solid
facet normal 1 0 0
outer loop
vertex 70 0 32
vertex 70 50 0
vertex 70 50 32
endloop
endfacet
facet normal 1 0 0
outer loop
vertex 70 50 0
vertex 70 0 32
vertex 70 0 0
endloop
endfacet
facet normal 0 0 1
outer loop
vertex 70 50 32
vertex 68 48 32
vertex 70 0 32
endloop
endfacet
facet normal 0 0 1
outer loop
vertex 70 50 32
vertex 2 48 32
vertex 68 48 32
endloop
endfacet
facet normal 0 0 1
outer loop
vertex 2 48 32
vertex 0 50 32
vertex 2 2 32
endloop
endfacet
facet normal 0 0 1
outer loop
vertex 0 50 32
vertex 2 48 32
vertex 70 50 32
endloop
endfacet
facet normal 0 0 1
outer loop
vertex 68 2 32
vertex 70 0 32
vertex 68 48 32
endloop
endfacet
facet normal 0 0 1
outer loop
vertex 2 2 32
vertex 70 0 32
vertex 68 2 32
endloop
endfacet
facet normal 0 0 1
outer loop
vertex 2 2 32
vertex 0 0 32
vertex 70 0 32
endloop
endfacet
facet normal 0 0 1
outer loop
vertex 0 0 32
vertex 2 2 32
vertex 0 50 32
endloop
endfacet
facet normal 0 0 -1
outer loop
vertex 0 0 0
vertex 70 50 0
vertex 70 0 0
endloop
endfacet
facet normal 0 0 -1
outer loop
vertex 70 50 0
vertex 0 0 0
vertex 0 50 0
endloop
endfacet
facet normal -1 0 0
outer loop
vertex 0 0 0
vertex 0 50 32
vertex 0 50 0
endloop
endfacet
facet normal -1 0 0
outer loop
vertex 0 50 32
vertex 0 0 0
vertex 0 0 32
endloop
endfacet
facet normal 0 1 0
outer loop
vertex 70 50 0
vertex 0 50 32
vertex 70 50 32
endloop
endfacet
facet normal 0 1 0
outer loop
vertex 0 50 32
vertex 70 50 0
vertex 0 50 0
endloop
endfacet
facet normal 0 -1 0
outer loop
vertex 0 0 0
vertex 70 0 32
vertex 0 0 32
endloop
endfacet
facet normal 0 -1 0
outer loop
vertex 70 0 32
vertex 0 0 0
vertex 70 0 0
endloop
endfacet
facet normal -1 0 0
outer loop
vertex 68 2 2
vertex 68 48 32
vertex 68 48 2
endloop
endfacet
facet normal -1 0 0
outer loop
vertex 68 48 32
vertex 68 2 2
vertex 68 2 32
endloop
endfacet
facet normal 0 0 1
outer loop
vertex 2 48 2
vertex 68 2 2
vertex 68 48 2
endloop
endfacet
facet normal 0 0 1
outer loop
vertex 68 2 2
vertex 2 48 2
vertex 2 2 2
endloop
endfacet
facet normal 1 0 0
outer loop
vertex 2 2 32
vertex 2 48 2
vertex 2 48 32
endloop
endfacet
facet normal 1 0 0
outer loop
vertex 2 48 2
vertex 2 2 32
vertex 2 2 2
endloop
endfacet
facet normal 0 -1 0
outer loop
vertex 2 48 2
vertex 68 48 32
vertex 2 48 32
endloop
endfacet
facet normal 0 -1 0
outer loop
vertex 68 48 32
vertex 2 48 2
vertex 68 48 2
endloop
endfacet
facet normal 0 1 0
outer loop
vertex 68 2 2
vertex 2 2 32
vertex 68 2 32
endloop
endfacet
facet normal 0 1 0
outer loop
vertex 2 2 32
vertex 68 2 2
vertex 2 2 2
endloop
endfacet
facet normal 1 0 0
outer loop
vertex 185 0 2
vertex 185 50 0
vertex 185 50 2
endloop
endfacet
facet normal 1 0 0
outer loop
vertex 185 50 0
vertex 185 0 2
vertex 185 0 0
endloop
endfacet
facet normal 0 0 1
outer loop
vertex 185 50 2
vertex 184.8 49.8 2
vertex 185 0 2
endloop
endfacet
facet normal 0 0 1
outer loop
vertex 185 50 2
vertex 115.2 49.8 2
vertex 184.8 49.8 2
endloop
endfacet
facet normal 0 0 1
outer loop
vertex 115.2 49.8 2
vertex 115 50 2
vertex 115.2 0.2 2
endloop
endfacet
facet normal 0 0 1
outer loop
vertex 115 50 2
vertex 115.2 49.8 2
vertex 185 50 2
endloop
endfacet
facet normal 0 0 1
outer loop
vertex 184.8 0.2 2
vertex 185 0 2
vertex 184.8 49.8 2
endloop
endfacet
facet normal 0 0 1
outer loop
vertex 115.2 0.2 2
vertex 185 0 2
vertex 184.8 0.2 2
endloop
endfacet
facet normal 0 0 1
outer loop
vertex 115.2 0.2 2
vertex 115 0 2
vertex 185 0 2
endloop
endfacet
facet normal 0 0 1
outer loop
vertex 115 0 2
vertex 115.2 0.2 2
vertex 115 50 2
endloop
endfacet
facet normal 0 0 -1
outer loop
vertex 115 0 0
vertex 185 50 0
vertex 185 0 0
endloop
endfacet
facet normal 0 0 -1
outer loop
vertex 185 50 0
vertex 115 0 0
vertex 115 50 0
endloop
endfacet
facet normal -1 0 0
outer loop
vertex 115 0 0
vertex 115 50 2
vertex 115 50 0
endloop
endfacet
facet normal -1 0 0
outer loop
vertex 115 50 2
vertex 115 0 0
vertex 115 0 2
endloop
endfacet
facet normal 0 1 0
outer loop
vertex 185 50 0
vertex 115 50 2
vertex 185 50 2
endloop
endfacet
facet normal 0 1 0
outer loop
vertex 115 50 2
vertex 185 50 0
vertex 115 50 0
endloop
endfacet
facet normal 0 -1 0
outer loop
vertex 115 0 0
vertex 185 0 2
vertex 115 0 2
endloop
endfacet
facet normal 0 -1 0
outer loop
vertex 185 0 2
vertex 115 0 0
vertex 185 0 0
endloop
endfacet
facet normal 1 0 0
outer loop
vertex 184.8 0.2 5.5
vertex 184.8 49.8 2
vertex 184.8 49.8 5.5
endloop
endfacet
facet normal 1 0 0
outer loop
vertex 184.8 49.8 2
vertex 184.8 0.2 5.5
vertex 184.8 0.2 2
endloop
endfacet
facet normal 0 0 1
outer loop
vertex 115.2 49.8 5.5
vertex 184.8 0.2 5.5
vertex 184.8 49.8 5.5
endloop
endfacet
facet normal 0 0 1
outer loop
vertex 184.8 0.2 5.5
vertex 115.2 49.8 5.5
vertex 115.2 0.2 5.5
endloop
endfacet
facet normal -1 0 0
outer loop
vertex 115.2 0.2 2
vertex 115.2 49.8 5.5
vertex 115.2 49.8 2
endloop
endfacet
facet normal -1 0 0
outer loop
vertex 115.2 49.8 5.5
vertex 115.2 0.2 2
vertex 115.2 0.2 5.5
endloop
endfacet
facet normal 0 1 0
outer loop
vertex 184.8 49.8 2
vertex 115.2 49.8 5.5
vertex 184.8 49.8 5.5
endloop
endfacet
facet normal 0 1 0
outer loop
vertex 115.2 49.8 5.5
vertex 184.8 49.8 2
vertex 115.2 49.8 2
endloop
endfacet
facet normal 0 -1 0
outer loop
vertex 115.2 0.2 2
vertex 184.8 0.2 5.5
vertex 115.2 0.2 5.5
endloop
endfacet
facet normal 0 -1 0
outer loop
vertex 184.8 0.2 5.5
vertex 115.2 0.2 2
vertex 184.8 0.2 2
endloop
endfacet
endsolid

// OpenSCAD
// Two-part box enclosure for a small electronics board, printed as one piece with a part
// between them. NOVEL general part.
//

box_x   = 70;
box_y   = 50;
box_z   = 30;
wall    = 2;
floor   = 2;

lip_t   = 1.5;
lip_h   = 4;
clearance = 0.2;

$fn = 48;

part_center_x = (box_x + box_x + 10) / 2;      // two parts with a 10 mm gap, centred on the bed
part_center_y = box_y / 2;

module box() {
    difference() {
        cube([box_x, box_y, box_z + floor]);
        translate([wall, wall, floor]) cube([box_x - 2 * wall, box_y - 2 * wall, box_z + 1]);   // hollow, open top
    }
}

module lid() {
    plate_h = 2;
    union() {
        translate([part_center_x - box_x / 2, part_center_y - box_y / 2, 0])
            cube([box_x, box_y, plate_h]);                                          // plate
        translate([part_center_x - (box_x / 2 - clearance), part_center_y - (box_y / 2 - clearance), 0])
            cube([box_x - 2 * clearance, box_y - 2 * clearance, lip_h + lip_t]);    // lip (open top)
    }
}

box();
translate([part_center_x, 0, 0]) lid();
